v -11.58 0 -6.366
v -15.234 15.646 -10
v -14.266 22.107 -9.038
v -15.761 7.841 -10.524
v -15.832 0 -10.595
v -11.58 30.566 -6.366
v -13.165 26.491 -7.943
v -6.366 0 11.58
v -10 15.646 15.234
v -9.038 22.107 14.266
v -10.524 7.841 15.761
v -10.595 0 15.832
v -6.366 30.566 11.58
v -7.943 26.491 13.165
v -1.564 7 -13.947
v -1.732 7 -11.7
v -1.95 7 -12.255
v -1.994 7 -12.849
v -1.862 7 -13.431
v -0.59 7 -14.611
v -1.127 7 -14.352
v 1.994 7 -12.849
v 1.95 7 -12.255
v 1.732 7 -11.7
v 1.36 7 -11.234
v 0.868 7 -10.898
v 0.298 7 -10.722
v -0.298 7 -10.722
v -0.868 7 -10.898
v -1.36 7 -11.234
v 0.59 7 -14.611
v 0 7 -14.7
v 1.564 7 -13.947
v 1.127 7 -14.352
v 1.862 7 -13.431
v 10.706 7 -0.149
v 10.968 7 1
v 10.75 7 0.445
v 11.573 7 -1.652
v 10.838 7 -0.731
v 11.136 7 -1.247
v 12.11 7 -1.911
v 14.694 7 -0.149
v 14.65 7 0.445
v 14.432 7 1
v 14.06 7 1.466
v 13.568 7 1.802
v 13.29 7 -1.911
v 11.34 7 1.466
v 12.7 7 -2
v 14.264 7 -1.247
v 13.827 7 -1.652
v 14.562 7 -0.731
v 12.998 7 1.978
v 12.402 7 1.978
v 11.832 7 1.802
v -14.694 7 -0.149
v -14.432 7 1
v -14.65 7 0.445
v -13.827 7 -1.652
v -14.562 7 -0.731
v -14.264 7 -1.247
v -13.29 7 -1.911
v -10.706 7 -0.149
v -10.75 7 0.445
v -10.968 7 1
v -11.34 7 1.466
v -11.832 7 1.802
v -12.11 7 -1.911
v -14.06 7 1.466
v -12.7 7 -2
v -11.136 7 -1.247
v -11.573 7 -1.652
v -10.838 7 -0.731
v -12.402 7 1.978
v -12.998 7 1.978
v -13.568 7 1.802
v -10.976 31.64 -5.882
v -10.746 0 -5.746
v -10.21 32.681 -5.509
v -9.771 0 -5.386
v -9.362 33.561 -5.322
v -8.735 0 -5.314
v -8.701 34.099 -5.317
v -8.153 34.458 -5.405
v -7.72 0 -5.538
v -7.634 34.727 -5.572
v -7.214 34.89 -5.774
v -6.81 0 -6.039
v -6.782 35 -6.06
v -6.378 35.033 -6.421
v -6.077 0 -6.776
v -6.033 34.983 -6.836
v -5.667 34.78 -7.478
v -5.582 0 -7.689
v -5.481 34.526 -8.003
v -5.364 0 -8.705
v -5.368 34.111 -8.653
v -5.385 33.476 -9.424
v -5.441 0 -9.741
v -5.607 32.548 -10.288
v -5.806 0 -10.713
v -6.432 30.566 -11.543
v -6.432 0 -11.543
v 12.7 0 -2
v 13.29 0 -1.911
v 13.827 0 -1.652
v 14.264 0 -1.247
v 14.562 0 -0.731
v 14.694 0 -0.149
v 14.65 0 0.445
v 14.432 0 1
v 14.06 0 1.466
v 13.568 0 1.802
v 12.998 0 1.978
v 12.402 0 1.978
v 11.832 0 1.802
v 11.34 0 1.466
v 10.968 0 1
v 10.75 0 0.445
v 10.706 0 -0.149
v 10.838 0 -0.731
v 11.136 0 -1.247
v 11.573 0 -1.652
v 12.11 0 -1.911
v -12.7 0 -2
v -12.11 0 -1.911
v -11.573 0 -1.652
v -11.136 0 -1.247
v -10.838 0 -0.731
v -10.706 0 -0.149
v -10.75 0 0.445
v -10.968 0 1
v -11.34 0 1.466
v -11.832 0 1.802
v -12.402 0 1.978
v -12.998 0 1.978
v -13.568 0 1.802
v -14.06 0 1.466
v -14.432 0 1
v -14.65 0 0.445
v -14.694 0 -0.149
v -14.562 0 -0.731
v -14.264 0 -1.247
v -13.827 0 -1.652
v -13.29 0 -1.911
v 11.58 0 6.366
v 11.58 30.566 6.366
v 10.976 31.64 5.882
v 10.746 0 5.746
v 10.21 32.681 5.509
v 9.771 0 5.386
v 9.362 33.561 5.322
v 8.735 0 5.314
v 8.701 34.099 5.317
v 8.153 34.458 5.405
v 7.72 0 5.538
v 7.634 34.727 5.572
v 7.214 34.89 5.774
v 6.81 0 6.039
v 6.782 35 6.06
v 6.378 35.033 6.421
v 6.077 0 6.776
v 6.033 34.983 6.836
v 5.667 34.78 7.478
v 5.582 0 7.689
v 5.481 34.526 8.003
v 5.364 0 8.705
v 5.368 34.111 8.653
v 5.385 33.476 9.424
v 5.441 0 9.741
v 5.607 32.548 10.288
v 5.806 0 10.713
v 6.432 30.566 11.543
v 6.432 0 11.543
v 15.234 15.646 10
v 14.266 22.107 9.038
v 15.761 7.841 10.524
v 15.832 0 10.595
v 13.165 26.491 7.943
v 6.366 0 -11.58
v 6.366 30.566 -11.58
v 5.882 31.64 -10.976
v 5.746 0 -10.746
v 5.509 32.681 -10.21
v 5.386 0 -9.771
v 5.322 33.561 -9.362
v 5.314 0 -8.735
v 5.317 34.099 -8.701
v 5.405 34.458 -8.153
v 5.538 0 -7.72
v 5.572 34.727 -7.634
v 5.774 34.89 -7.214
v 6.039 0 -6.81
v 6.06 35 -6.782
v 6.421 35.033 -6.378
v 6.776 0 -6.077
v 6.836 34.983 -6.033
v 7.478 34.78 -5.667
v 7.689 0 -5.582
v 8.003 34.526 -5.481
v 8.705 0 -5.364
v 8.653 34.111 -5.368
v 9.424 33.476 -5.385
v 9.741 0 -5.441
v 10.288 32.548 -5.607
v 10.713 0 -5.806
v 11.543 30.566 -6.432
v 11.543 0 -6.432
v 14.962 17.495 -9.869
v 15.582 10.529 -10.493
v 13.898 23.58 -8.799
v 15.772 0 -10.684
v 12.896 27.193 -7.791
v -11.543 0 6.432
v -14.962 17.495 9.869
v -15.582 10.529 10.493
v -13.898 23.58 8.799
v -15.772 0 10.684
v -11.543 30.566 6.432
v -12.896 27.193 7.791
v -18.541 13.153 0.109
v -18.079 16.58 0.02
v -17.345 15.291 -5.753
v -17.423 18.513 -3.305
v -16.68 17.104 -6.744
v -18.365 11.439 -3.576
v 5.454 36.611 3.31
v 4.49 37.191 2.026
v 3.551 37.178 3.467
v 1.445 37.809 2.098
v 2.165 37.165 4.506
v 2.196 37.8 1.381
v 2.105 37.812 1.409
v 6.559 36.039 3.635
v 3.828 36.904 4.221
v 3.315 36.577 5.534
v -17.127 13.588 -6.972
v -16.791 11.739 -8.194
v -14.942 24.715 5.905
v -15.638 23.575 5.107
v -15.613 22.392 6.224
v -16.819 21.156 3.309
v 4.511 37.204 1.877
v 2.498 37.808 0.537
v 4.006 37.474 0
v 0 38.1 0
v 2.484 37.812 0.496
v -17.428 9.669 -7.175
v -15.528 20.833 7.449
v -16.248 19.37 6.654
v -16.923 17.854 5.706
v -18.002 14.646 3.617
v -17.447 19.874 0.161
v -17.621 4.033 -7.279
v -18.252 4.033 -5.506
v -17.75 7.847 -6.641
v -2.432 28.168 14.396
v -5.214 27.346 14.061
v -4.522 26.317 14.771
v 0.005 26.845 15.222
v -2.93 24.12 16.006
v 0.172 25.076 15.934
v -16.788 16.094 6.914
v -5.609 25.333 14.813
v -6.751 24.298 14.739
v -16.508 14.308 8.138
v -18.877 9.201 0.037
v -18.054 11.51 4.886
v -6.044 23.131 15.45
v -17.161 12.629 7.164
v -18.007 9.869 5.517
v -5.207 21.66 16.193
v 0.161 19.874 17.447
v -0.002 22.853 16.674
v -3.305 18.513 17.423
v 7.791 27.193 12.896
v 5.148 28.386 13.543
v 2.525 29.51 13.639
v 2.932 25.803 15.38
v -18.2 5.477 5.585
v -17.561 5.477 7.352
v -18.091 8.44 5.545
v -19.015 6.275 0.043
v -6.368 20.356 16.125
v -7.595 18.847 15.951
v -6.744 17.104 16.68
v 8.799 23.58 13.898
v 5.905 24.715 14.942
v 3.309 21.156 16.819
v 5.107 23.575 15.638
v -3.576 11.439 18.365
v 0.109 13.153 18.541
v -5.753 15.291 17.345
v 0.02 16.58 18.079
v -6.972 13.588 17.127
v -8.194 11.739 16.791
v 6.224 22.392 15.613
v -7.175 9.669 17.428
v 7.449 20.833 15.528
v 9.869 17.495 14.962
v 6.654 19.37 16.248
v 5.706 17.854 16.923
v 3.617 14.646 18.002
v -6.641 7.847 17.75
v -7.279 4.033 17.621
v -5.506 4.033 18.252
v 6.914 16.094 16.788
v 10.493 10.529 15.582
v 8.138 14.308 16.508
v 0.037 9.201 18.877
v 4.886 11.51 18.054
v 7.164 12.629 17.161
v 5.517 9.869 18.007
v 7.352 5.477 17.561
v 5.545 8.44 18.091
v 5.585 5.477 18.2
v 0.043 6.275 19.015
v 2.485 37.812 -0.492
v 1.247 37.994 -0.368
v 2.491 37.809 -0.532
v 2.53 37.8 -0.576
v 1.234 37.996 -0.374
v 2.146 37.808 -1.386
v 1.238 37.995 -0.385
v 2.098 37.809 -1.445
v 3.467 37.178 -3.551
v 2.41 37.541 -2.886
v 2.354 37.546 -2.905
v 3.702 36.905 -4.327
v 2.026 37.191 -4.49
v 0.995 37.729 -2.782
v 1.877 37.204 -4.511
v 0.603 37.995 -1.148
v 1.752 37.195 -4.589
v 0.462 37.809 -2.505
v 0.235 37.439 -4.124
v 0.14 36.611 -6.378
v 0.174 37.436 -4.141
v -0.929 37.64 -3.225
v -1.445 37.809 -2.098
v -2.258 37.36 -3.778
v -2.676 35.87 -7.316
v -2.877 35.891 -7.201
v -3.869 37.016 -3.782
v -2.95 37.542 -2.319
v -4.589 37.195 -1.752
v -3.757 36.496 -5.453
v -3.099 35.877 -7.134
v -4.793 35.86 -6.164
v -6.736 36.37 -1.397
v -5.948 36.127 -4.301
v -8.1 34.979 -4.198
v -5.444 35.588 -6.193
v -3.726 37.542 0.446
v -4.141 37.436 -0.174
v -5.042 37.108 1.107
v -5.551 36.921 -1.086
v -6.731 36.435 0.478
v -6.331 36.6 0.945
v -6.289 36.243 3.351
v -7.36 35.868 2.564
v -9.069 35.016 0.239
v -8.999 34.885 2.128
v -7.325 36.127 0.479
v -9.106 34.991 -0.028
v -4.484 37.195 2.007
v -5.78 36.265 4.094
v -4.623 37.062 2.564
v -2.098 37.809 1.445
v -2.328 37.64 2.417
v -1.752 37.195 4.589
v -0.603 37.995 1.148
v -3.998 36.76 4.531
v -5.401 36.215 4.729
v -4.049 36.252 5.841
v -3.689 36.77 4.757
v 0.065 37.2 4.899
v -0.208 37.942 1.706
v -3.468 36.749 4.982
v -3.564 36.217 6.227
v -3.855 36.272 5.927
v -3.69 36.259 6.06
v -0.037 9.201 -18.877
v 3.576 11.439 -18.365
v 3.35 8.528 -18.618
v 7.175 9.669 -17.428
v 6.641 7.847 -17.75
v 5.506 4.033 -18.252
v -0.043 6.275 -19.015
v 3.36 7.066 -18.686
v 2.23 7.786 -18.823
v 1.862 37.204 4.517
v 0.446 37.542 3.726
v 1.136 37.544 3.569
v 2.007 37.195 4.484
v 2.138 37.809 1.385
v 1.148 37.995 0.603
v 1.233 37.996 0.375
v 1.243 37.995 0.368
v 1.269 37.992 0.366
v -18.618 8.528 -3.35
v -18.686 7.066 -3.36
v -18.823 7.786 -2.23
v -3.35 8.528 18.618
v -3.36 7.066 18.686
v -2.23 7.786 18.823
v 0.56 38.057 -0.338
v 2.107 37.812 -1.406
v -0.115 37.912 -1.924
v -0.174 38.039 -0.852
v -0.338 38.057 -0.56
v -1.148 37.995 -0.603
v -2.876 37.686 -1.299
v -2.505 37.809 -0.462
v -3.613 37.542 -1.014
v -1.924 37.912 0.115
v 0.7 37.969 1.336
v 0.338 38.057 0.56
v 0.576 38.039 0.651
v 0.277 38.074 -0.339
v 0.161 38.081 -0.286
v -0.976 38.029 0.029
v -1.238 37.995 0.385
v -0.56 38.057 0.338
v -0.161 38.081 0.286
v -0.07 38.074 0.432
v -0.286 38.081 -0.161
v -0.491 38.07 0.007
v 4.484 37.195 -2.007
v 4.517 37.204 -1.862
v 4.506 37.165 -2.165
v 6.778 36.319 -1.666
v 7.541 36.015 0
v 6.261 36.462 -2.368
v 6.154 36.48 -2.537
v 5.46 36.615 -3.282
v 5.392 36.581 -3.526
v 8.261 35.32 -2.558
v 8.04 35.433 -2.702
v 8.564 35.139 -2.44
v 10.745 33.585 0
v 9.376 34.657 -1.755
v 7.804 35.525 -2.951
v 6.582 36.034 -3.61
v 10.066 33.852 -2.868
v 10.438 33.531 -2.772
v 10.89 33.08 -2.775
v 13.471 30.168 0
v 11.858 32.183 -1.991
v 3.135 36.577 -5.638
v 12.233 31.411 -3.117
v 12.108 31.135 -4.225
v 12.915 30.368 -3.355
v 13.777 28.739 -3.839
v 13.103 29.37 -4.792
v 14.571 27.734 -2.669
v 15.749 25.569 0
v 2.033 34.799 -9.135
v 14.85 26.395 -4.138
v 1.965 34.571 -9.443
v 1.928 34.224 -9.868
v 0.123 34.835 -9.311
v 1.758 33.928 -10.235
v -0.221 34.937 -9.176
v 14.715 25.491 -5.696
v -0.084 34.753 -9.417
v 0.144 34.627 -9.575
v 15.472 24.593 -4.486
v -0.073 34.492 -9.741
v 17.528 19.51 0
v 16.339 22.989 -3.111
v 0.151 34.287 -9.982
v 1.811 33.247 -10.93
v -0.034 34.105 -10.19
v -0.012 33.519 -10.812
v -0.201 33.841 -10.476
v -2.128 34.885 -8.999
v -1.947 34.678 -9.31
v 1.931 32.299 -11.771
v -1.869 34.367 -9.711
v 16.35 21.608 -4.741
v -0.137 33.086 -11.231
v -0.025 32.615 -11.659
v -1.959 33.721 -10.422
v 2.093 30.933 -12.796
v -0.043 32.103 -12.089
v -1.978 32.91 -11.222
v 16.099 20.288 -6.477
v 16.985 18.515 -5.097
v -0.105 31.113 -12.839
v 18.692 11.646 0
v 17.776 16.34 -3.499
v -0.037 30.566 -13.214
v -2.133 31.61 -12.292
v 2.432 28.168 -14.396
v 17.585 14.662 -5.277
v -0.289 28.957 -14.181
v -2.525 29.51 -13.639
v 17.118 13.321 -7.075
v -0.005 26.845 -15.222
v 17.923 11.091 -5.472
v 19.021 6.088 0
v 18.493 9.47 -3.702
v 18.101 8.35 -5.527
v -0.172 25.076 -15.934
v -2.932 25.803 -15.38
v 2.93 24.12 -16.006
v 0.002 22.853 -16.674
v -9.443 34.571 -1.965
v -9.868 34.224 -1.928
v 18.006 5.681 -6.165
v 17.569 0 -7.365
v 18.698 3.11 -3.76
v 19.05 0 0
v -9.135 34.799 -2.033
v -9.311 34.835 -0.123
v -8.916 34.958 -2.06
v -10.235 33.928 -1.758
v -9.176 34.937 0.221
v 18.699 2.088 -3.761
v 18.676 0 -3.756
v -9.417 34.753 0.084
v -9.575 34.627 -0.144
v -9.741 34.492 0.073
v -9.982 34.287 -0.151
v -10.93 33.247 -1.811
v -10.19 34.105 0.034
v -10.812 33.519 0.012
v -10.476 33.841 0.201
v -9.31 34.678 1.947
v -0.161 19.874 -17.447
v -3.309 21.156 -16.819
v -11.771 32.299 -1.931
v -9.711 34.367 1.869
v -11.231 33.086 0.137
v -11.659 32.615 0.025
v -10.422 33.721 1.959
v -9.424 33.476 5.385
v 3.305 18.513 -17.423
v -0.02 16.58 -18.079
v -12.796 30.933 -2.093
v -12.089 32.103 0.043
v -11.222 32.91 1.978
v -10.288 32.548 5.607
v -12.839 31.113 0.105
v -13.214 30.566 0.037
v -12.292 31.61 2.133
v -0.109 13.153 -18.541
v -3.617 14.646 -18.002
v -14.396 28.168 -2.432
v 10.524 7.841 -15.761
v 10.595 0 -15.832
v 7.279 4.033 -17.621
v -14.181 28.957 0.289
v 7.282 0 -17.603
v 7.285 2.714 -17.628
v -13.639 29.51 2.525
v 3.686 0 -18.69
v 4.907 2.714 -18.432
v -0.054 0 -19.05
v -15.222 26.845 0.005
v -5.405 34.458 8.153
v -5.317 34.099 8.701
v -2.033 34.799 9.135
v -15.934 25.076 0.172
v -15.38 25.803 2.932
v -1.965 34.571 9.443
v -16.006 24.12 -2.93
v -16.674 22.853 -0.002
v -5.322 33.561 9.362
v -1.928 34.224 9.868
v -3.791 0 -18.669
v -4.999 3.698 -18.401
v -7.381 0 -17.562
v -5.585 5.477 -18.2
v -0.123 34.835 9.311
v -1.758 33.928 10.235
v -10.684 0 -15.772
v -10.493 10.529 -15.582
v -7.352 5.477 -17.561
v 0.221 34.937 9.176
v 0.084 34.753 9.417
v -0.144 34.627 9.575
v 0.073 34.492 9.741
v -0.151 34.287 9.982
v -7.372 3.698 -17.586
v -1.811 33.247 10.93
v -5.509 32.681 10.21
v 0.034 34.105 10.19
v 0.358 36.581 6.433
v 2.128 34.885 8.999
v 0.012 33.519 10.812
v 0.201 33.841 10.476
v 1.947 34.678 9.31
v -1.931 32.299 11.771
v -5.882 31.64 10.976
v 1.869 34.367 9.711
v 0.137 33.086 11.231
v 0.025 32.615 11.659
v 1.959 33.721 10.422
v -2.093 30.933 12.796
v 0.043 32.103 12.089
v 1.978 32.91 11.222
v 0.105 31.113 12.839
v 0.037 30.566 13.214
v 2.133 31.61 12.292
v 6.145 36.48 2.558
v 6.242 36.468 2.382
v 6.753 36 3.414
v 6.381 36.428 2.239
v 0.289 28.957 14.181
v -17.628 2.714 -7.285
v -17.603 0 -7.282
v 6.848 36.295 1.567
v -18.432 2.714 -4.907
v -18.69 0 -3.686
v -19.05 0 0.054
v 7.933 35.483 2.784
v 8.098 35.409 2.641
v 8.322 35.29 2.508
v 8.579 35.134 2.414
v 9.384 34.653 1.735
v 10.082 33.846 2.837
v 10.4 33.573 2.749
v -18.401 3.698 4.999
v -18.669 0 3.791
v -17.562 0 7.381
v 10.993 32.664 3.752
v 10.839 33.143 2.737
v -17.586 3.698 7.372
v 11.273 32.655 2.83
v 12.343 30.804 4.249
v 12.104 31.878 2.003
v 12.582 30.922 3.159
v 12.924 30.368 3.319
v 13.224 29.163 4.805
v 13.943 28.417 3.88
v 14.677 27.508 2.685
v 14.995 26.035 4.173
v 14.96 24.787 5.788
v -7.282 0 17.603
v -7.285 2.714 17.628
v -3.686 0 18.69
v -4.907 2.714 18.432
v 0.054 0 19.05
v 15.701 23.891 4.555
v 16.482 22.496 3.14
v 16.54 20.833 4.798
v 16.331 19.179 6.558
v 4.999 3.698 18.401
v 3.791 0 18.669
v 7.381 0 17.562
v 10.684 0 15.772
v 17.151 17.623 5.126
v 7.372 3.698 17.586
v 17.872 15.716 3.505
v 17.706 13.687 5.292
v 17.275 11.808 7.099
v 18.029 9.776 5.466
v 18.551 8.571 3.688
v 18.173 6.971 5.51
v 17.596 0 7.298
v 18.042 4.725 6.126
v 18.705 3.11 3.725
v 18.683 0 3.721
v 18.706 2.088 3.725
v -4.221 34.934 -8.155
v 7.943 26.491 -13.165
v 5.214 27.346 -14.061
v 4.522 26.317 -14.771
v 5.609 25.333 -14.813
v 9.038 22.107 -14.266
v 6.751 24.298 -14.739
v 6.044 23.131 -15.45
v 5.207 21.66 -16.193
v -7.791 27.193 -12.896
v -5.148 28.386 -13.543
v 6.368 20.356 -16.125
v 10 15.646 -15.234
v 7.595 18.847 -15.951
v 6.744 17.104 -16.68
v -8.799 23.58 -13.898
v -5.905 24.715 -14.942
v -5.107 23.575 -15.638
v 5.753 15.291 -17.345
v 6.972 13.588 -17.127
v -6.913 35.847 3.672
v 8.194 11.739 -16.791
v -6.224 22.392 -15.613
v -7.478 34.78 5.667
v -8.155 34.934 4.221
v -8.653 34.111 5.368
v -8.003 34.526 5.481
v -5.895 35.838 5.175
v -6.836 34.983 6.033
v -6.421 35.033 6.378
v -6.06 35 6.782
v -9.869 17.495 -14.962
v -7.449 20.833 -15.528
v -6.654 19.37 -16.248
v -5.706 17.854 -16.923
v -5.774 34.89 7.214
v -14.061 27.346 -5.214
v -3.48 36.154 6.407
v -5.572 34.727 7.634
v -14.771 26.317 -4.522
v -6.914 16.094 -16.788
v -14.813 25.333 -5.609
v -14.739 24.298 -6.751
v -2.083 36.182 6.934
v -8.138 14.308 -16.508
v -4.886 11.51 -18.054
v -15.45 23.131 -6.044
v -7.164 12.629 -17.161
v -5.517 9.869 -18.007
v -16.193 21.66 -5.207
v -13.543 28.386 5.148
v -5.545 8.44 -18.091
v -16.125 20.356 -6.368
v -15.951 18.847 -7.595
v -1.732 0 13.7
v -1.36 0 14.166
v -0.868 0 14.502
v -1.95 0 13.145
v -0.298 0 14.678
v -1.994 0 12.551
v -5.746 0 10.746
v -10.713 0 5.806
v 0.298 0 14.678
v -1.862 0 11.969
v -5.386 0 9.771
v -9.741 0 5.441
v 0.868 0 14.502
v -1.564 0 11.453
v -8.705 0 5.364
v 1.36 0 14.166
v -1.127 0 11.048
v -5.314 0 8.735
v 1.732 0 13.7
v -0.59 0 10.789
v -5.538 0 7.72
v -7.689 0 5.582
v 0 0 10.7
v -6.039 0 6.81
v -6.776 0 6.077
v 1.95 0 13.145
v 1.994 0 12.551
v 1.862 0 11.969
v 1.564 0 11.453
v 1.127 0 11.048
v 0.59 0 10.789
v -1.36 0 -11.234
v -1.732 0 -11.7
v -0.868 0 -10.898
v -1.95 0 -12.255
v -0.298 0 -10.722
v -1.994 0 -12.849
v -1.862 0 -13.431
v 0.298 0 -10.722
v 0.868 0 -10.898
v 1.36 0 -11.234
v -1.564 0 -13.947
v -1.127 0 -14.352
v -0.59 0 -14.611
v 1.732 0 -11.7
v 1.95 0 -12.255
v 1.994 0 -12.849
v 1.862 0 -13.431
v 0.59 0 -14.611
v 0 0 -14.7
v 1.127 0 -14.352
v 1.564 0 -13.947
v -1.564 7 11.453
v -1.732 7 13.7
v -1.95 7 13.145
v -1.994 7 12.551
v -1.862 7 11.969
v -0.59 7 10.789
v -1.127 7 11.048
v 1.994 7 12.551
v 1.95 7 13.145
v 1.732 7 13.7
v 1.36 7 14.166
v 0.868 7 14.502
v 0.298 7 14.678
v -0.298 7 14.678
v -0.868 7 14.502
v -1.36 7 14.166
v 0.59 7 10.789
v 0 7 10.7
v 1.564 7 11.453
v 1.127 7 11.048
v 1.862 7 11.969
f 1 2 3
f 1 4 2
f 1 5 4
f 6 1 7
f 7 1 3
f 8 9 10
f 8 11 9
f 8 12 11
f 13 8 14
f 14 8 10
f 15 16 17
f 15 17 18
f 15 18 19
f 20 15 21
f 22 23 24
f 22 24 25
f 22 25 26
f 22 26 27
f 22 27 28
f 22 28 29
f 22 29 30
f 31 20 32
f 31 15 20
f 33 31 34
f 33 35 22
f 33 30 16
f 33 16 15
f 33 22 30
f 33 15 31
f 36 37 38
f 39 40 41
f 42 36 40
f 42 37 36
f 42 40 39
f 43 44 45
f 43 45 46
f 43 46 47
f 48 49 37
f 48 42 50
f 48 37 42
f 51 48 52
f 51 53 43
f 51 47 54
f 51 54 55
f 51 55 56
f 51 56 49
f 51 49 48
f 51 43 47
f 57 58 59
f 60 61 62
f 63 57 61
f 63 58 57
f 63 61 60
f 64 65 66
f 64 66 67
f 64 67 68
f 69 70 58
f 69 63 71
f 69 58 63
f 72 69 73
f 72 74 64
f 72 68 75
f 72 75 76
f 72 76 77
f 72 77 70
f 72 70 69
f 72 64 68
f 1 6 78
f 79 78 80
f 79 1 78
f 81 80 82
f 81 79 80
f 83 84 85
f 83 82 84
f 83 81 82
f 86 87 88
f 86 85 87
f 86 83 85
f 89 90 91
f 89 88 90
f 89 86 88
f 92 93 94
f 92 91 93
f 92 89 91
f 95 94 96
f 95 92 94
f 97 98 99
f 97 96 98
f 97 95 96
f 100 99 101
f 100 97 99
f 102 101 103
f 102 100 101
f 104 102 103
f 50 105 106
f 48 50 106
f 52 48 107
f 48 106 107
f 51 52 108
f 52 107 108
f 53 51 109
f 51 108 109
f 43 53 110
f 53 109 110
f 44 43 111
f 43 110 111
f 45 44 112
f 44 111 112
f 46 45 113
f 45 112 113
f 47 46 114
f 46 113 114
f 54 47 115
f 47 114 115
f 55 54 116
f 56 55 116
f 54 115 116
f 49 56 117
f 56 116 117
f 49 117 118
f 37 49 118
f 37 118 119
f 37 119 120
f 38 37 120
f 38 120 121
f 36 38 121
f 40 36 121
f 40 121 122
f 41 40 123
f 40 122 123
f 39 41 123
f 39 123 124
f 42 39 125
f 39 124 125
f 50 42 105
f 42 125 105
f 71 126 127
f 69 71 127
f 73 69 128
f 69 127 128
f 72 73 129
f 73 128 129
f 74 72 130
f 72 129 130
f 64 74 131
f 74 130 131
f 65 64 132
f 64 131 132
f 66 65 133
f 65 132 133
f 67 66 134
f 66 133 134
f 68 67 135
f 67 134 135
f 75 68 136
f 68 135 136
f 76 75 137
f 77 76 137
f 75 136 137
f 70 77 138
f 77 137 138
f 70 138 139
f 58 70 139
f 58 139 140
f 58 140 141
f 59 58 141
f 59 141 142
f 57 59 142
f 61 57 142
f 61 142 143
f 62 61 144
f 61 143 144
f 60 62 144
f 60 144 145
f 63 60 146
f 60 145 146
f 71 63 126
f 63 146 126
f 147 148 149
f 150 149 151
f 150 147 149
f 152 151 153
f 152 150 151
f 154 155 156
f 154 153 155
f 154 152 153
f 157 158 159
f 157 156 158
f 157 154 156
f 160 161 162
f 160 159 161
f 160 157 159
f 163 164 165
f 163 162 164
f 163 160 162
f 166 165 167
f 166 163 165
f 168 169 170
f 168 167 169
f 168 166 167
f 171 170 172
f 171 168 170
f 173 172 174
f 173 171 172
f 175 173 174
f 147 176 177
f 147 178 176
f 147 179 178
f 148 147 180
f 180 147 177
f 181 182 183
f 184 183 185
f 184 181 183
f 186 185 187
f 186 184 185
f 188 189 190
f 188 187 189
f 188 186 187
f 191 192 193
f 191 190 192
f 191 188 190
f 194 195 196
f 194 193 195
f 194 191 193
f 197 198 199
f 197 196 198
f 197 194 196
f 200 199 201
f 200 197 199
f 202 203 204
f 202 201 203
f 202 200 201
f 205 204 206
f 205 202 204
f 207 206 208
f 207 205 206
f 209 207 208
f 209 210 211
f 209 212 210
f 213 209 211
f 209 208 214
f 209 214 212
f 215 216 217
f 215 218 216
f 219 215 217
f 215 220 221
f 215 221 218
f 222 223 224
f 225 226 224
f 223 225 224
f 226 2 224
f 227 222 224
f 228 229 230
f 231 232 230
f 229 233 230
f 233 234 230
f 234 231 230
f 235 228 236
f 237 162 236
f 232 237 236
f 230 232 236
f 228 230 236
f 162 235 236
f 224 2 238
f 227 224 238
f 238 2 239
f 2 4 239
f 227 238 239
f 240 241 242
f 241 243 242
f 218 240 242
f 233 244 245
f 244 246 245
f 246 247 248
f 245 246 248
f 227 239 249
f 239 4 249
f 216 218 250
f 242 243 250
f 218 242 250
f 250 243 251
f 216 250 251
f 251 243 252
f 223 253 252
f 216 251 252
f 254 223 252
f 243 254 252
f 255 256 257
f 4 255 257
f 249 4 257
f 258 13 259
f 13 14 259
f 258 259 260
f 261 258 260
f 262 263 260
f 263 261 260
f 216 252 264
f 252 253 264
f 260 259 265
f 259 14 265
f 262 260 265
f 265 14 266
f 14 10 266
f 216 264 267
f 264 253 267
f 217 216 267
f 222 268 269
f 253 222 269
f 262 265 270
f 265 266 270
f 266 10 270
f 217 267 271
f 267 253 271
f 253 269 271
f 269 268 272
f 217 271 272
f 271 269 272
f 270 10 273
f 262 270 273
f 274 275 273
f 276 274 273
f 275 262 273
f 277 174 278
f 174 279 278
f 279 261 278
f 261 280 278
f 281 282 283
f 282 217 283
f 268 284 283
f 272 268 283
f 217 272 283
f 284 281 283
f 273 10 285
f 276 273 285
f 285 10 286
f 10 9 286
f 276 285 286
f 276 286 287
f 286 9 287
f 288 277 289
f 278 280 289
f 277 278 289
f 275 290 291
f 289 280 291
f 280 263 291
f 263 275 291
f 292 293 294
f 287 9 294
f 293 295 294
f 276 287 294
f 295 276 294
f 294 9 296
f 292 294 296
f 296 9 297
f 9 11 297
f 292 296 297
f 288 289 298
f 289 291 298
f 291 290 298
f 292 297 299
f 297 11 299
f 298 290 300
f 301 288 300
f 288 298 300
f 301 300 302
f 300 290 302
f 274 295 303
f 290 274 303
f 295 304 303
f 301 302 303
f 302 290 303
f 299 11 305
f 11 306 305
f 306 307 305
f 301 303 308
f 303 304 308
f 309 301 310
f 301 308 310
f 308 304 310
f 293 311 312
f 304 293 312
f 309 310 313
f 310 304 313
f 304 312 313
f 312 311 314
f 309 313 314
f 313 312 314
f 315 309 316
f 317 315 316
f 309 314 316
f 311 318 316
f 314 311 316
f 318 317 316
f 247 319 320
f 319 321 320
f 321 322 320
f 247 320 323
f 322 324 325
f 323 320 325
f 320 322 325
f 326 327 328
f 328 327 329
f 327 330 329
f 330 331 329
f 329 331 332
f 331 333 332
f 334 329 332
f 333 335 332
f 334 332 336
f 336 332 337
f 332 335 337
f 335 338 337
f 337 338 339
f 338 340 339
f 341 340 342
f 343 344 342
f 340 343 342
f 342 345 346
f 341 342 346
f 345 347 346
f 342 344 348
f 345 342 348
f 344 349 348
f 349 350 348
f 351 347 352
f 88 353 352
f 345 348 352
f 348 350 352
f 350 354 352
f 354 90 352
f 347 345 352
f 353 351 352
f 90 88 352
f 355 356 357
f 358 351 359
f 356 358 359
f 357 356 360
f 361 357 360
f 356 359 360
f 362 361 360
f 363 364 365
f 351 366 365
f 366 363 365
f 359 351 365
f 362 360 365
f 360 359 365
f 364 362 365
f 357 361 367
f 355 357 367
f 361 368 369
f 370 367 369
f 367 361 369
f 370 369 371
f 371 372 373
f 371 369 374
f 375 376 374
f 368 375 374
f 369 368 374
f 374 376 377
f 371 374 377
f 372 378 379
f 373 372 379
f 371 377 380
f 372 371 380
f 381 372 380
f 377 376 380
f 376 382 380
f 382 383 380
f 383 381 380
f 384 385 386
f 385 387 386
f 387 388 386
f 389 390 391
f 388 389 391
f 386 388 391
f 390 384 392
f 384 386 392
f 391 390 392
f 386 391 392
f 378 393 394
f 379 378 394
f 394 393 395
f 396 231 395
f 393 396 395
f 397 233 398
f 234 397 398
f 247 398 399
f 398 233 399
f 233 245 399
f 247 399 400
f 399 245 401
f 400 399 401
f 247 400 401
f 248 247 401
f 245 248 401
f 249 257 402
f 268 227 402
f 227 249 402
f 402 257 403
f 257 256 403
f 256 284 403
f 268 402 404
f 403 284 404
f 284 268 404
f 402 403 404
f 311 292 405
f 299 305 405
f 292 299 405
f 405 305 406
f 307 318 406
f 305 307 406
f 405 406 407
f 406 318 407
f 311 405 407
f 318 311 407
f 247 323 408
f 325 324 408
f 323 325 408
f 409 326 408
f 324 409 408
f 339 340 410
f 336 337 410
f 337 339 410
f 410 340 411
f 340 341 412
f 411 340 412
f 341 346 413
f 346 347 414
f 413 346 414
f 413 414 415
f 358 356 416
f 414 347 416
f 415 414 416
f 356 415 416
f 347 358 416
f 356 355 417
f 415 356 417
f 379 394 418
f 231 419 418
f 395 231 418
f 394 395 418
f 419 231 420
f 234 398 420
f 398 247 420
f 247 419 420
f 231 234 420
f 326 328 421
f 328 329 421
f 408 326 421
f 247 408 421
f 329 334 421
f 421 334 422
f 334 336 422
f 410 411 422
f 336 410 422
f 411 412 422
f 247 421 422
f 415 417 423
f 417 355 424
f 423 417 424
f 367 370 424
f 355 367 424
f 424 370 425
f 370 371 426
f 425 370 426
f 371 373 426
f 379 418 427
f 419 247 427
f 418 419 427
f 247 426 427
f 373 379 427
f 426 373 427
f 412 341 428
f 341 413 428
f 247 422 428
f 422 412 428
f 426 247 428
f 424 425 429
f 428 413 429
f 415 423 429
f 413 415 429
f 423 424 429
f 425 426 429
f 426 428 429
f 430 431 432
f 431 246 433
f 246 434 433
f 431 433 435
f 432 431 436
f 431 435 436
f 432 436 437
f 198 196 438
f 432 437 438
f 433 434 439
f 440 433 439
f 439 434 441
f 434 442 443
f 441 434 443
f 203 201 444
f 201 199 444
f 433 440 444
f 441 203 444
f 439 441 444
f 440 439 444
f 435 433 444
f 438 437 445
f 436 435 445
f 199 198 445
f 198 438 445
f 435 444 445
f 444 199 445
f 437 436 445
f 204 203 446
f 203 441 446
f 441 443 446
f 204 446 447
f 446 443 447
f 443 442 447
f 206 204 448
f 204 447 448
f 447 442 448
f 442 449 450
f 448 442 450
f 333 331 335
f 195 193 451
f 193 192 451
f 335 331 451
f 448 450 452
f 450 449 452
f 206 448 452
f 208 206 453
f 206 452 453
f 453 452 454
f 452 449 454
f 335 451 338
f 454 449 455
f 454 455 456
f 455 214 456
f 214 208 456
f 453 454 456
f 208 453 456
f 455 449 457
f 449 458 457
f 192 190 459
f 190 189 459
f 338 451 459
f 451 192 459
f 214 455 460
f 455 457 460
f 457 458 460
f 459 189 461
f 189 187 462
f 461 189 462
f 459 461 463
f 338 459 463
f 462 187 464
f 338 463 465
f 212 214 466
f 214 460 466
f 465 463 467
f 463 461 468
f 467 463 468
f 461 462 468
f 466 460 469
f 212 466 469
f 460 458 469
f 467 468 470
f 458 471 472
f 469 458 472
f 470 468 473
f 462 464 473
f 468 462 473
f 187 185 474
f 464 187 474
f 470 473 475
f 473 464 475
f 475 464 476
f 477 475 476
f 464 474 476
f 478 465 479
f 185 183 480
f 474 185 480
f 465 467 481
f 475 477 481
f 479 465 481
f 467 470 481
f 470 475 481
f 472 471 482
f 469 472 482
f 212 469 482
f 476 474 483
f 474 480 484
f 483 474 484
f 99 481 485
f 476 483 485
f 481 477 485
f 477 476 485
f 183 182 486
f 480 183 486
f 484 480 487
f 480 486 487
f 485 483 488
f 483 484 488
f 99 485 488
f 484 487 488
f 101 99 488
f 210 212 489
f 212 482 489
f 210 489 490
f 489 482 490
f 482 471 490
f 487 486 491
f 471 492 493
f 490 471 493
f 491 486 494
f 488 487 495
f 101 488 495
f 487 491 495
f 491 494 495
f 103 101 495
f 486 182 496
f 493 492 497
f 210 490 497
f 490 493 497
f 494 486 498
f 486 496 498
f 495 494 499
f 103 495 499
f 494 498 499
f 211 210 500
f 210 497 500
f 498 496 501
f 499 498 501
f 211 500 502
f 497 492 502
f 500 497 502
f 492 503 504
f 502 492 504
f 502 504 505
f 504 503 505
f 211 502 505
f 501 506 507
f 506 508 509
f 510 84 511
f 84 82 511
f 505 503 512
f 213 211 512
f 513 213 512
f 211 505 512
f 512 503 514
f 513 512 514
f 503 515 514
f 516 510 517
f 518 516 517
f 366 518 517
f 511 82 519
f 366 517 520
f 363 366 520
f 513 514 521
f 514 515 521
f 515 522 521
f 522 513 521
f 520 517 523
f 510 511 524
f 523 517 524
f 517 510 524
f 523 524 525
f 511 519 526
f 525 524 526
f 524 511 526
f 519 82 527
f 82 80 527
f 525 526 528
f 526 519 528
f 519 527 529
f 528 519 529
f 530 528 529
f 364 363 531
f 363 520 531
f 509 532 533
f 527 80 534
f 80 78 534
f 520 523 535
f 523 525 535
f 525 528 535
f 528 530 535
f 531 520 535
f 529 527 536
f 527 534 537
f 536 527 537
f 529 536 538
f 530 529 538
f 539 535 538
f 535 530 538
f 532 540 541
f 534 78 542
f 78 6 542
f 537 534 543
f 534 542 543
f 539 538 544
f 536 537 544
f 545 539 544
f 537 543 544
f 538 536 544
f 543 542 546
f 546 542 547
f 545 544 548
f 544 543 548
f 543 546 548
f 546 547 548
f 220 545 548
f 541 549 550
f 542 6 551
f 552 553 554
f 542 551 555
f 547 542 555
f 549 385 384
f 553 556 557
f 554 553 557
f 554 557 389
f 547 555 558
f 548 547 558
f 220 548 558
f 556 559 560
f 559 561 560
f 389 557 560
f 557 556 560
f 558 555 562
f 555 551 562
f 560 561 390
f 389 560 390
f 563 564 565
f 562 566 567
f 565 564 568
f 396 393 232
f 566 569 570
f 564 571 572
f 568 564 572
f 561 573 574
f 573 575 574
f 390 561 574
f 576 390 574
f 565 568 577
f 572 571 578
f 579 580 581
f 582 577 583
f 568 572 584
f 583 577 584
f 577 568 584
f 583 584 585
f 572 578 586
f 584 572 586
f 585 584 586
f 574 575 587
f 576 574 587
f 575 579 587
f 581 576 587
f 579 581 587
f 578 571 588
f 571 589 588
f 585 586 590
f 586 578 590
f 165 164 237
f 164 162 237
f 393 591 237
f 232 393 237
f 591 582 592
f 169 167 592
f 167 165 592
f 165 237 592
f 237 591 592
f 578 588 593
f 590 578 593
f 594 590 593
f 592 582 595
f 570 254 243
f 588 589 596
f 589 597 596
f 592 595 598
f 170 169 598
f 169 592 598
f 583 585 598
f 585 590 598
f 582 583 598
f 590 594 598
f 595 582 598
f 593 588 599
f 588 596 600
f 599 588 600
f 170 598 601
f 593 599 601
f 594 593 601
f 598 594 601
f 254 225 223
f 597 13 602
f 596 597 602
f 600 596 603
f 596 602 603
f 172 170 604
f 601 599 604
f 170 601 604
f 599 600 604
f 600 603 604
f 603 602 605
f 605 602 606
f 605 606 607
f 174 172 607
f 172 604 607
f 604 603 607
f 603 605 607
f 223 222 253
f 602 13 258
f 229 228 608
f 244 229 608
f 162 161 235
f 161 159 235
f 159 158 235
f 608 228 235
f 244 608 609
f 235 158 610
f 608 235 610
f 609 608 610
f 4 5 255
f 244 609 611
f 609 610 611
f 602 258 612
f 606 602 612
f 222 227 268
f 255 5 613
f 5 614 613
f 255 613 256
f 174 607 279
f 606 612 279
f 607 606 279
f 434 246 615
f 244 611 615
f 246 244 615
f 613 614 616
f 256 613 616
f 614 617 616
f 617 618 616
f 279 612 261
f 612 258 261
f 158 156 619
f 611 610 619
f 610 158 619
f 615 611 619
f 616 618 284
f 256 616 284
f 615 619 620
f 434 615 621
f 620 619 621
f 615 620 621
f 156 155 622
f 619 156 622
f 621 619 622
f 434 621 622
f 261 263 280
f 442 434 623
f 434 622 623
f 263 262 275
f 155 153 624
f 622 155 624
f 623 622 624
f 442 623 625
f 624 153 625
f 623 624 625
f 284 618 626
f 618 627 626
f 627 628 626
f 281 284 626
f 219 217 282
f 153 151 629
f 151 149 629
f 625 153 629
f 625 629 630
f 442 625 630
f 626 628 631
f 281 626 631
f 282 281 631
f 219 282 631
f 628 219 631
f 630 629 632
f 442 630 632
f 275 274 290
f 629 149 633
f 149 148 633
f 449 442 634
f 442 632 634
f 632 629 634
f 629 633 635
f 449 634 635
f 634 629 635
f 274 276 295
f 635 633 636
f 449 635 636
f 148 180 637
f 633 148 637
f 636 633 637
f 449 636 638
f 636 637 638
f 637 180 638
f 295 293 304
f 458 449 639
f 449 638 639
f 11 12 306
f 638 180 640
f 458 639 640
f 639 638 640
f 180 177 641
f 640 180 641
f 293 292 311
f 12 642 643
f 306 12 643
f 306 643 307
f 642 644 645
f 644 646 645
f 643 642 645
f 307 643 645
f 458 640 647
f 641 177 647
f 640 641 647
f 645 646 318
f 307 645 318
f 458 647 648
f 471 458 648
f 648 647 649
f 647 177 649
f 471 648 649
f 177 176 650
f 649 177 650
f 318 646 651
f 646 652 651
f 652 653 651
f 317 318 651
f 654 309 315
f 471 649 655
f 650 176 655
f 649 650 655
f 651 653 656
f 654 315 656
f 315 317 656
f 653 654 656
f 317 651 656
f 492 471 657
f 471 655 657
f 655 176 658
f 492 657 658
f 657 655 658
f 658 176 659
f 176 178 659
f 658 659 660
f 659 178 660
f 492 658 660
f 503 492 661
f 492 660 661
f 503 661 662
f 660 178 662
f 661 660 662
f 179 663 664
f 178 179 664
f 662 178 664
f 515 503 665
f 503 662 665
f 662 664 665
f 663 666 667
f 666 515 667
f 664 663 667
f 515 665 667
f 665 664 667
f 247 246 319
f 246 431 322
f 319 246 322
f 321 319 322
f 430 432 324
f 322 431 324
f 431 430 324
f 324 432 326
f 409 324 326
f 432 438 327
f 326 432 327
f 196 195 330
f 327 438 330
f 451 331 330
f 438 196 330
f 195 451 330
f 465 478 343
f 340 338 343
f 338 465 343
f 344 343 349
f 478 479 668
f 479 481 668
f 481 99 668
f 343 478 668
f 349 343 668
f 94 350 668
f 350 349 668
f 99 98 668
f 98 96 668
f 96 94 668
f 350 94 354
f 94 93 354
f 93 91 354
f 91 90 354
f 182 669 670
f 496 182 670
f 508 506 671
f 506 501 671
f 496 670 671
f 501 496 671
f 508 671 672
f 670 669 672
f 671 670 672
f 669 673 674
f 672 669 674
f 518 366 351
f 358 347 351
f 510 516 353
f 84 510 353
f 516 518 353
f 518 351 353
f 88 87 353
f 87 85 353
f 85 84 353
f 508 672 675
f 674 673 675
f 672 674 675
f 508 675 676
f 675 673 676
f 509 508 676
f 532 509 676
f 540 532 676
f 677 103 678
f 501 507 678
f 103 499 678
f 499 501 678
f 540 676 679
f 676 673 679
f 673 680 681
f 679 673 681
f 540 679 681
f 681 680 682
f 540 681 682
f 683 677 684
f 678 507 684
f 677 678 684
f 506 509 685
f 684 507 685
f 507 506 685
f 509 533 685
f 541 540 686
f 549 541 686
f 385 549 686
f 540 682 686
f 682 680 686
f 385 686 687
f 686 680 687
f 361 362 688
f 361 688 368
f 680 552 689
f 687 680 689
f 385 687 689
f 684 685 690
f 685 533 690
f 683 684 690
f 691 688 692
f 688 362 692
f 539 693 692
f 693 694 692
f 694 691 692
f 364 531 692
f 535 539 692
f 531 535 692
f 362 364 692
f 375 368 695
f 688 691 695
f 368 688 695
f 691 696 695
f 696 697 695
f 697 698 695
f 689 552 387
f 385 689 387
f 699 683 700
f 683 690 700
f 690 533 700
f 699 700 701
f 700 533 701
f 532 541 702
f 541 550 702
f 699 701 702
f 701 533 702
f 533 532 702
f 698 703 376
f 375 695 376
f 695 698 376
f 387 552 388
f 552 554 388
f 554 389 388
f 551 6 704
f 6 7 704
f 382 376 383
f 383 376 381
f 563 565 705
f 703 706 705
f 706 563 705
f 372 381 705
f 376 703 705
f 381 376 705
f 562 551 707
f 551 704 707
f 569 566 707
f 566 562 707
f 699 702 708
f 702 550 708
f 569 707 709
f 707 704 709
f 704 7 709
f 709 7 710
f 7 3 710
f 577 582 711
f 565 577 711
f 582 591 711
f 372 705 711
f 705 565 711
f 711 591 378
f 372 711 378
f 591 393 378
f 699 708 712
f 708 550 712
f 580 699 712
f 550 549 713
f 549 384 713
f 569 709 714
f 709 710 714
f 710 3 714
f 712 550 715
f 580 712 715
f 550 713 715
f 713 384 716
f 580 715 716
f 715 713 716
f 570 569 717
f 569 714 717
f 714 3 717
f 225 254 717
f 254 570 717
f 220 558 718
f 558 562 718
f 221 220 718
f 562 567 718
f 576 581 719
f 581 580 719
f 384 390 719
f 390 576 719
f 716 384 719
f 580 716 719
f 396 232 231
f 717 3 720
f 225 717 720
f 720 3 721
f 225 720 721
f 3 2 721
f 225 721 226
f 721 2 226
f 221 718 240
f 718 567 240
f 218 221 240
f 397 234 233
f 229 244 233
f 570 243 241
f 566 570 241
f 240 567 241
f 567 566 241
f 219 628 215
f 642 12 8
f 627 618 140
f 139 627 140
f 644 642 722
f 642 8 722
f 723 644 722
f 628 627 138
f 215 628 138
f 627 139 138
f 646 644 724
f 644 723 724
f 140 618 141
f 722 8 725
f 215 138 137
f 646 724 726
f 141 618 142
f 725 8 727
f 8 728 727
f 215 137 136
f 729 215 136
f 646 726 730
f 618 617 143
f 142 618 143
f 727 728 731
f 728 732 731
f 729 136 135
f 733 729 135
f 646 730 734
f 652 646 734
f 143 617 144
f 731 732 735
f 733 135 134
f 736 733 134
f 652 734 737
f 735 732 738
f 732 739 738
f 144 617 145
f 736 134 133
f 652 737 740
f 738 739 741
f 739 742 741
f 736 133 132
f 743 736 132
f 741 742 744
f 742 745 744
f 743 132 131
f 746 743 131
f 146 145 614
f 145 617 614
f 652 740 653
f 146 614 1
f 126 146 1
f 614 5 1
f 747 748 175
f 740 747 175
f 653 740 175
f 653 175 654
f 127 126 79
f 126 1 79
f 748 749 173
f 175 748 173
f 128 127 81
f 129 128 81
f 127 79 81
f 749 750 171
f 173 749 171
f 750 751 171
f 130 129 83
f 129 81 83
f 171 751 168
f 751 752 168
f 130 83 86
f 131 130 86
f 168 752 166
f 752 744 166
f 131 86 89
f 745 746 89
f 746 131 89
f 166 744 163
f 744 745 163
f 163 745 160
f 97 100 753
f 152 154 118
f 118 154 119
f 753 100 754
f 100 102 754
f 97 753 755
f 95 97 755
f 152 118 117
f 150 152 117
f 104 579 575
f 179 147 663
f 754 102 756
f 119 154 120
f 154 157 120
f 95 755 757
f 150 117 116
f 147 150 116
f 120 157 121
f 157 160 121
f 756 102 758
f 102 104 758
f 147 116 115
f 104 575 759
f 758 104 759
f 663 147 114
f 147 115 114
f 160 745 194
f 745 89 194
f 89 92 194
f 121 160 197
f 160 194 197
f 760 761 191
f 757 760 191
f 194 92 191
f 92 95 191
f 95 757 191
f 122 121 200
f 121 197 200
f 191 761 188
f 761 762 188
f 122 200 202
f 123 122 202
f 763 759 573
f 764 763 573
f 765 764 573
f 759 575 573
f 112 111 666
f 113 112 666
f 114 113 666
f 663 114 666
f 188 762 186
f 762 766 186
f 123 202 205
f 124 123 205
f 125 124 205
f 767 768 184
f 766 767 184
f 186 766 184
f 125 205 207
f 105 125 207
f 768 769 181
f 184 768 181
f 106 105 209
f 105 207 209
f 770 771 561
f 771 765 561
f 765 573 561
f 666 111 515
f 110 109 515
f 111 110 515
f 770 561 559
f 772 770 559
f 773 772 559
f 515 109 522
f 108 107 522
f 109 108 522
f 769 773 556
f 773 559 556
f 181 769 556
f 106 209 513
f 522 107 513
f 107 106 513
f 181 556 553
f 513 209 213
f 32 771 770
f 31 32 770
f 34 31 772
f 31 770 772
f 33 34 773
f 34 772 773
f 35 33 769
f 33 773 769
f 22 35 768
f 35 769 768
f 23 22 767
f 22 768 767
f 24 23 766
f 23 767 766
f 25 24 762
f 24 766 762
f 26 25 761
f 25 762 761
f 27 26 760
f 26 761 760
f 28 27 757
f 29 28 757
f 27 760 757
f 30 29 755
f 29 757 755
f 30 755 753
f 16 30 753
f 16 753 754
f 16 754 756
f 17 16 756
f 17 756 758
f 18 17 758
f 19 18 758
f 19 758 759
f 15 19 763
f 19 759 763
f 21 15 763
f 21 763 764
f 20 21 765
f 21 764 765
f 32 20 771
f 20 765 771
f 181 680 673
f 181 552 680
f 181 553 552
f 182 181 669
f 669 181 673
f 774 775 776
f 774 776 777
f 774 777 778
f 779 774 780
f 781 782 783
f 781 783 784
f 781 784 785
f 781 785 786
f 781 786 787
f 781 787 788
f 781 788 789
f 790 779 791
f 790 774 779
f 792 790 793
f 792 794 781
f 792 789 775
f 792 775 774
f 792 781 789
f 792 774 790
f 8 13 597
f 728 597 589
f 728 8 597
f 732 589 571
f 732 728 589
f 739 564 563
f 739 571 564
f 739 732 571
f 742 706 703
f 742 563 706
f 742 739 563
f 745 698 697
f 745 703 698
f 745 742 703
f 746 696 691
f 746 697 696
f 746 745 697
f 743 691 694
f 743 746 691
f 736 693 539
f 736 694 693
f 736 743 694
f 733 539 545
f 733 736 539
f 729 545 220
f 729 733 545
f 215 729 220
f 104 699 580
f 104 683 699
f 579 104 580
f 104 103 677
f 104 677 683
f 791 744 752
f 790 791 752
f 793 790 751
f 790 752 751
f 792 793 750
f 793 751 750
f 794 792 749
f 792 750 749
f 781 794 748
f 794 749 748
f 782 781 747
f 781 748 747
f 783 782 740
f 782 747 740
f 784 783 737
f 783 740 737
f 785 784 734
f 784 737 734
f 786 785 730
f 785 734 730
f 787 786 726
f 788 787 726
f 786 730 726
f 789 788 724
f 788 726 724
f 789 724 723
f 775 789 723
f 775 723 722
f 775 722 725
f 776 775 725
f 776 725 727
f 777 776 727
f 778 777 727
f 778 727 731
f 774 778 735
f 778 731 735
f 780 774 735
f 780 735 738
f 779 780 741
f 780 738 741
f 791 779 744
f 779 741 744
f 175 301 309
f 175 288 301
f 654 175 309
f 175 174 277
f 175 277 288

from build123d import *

# Parameters (mm, degrees)
SKETCH3_R          = 2.000000064
CUT_EXTRUDE1_DEPTH = 6.99999997
CUT_EXTRUDE3_REACH = 48.683


with BuildPart() as part:
    # Sketch1 → Revolve1 (revolve)
    with BuildSketch(Plane.XY):
        with BuildLine():
            Line((0, 0), (0, 38.1))
            add(Edge.make_bspline(
                [(0, 38.1), (19.753060043, 37.128354082), (19.05, 0)],
                knots=[0, 0, 0, 1, 1, 1], degree=2))
            Line((19.05, 0), (0, 0))
        make_face()
    revolve(axis=Axis((0, 0, 0), (0, 1, 0)))

    # Sketch3 → Cut-Extrude1 (cut)
    with BuildSketch(Plane.XZ):
        with Locations(Location((12.7, 0, 0), (0, 0, 270))):
            Circle(SKETCH3_R)
        with Locations(Location((-12.7, 0, 0), (0, 0, 270))):
            Circle(SKETCH3_R)
        with Locations(Location((0, 12.7, 0), (0, 0, 270))):
            Circle(SKETCH3_R)
        with Locations(Location((0, -12.7, 0), (0, 0, 270))):
            Circle(SKETCH3_R)
    extrude(amount=-CUT_EXTRUDE1_DEPTH, mode=Mode.SUBTRACT)

    # Sketch4 → Cut-Extrude3 (cut, up to next)
    with BuildSketch(Plane.XZ, mode=Mode.PRIVATE) as cut_extrude3_sk1:
        with BuildLine():
            Line((20.585051469, 15.321285367), (11.579529978, 6.366365899))
            ThreePointArc((11.579529978, 6.366365899), (6.416967921, 6.38091098), (6.431513003, 11.543473038))
            Line((6.431513003, 11.543473038), (15.437034493, 20.498392506))
            ThreePointArc((15.437034493, 20.498392506), (20.599596551, 20.483847424), (20.585051469, 15.321285367))
        make_face()
    cut_extrude3_tool1 = extrude(cut_extrude3_sk1.sketch, amount=-CUT_EXTRUDE3_REACH, mode=Mode.PRIVATE) & part.part
    # Sketch4 → Cut-Extrude3 (cut, up to next)
    with BuildSketch(Plane.XZ, mode=Mode.PRIVATE) as cut_extrude3_sk2:
        with BuildLine():
            Line((15.321285367, -20.585051469), (6.366365899, -11.579529978))
            ThreePointArc((6.366365899, -11.579529978), (6.38091098, -6.416967921), (11.543473038, -6.431513003))
            Line((11.543473038, -6.431513003), (20.498392506, -15.437034493))
            ThreePointArc((20.498392506, -15.437034493), (20.483847424, -20.599596551), (15.321285367, -20.585051469))
        make_face()
    cut_extrude3_tool2 = extrude(cut_extrude3_sk2.sketch, amount=-CUT_EXTRUDE3_REACH, mode=Mode.PRIVATE) & part.part
    # Sketch4 → Cut-Extrude3 (cut, up to next)
    with BuildSketch(Plane.XZ, mode=Mode.PRIVATE) as cut_extrude3_sk3:
        with BuildLine():
            Line((-20.585051469, -15.321285367), (-11.579529978, -6.366365899))
            ThreePointArc((-11.579529978, -6.366365899), (-6.416967921, -6.38091098), (-6.431513003, -11.543473038))
            Line((-6.431513003, -11.543473038), (-15.437034493, -20.498392506))
            ThreePointArc((-15.437034493, -20.498392506), (-20.599596551, -20.483847424), (-20.585051469, -15.321285367))
        make_face()
    cut_extrude3_tool3 = extrude(cut_extrude3_sk3.sketch, amount=-CUT_EXTRUDE3_REACH, mode=Mode.PRIVATE) & part.part
    # Sketch4 → Cut-Extrude3 (cut, up to next)
    with BuildSketch(Plane.XZ, mode=Mode.PRIVATE) as cut_extrude3_sk4:
        with BuildLine():
            Line((-15.321285367, 20.585051469), (-6.366365899, 11.579529978))
            ThreePointArc((-6.366365899, 11.579529978), (-6.38091098, 6.416967921), (-11.543473038, 6.431513003))
            Line((-11.543473038, 6.431513003), (-20.498392506, 15.437034493))
            ThreePointArc((-20.498392506, 15.437034493), (-20.483847424, 20.599596551), (-15.321285367, 20.585051469))
        make_face()
    cut_extrude3_tool4 = extrude(cut_extrude3_sk4.sketch, amount=-CUT_EXTRUDE3_REACH, mode=Mode.PRIVATE) & part.part
    add(cut_extrude3_tool1.solids().sort_by_distance((13.508282, 0, 13.432379))[0], mode=Mode.SUBTRACT)
    add(cut_extrude3_tool2.solids().sort_by_distance((13.432379, 0, -13.508282))[0], mode=Mode.SUBTRACT)
    add(cut_extrude3_tool3.solids().sort_by_distance((-13.508282, 0, -13.432379))[0], mode=Mode.SUBTRACT)
    add(cut_extrude3_tool4.solids().sort_by_distance((-13.432379, 0, 13.508282))[0], mode=Mode.SUBTRACT)


solid = part.part
